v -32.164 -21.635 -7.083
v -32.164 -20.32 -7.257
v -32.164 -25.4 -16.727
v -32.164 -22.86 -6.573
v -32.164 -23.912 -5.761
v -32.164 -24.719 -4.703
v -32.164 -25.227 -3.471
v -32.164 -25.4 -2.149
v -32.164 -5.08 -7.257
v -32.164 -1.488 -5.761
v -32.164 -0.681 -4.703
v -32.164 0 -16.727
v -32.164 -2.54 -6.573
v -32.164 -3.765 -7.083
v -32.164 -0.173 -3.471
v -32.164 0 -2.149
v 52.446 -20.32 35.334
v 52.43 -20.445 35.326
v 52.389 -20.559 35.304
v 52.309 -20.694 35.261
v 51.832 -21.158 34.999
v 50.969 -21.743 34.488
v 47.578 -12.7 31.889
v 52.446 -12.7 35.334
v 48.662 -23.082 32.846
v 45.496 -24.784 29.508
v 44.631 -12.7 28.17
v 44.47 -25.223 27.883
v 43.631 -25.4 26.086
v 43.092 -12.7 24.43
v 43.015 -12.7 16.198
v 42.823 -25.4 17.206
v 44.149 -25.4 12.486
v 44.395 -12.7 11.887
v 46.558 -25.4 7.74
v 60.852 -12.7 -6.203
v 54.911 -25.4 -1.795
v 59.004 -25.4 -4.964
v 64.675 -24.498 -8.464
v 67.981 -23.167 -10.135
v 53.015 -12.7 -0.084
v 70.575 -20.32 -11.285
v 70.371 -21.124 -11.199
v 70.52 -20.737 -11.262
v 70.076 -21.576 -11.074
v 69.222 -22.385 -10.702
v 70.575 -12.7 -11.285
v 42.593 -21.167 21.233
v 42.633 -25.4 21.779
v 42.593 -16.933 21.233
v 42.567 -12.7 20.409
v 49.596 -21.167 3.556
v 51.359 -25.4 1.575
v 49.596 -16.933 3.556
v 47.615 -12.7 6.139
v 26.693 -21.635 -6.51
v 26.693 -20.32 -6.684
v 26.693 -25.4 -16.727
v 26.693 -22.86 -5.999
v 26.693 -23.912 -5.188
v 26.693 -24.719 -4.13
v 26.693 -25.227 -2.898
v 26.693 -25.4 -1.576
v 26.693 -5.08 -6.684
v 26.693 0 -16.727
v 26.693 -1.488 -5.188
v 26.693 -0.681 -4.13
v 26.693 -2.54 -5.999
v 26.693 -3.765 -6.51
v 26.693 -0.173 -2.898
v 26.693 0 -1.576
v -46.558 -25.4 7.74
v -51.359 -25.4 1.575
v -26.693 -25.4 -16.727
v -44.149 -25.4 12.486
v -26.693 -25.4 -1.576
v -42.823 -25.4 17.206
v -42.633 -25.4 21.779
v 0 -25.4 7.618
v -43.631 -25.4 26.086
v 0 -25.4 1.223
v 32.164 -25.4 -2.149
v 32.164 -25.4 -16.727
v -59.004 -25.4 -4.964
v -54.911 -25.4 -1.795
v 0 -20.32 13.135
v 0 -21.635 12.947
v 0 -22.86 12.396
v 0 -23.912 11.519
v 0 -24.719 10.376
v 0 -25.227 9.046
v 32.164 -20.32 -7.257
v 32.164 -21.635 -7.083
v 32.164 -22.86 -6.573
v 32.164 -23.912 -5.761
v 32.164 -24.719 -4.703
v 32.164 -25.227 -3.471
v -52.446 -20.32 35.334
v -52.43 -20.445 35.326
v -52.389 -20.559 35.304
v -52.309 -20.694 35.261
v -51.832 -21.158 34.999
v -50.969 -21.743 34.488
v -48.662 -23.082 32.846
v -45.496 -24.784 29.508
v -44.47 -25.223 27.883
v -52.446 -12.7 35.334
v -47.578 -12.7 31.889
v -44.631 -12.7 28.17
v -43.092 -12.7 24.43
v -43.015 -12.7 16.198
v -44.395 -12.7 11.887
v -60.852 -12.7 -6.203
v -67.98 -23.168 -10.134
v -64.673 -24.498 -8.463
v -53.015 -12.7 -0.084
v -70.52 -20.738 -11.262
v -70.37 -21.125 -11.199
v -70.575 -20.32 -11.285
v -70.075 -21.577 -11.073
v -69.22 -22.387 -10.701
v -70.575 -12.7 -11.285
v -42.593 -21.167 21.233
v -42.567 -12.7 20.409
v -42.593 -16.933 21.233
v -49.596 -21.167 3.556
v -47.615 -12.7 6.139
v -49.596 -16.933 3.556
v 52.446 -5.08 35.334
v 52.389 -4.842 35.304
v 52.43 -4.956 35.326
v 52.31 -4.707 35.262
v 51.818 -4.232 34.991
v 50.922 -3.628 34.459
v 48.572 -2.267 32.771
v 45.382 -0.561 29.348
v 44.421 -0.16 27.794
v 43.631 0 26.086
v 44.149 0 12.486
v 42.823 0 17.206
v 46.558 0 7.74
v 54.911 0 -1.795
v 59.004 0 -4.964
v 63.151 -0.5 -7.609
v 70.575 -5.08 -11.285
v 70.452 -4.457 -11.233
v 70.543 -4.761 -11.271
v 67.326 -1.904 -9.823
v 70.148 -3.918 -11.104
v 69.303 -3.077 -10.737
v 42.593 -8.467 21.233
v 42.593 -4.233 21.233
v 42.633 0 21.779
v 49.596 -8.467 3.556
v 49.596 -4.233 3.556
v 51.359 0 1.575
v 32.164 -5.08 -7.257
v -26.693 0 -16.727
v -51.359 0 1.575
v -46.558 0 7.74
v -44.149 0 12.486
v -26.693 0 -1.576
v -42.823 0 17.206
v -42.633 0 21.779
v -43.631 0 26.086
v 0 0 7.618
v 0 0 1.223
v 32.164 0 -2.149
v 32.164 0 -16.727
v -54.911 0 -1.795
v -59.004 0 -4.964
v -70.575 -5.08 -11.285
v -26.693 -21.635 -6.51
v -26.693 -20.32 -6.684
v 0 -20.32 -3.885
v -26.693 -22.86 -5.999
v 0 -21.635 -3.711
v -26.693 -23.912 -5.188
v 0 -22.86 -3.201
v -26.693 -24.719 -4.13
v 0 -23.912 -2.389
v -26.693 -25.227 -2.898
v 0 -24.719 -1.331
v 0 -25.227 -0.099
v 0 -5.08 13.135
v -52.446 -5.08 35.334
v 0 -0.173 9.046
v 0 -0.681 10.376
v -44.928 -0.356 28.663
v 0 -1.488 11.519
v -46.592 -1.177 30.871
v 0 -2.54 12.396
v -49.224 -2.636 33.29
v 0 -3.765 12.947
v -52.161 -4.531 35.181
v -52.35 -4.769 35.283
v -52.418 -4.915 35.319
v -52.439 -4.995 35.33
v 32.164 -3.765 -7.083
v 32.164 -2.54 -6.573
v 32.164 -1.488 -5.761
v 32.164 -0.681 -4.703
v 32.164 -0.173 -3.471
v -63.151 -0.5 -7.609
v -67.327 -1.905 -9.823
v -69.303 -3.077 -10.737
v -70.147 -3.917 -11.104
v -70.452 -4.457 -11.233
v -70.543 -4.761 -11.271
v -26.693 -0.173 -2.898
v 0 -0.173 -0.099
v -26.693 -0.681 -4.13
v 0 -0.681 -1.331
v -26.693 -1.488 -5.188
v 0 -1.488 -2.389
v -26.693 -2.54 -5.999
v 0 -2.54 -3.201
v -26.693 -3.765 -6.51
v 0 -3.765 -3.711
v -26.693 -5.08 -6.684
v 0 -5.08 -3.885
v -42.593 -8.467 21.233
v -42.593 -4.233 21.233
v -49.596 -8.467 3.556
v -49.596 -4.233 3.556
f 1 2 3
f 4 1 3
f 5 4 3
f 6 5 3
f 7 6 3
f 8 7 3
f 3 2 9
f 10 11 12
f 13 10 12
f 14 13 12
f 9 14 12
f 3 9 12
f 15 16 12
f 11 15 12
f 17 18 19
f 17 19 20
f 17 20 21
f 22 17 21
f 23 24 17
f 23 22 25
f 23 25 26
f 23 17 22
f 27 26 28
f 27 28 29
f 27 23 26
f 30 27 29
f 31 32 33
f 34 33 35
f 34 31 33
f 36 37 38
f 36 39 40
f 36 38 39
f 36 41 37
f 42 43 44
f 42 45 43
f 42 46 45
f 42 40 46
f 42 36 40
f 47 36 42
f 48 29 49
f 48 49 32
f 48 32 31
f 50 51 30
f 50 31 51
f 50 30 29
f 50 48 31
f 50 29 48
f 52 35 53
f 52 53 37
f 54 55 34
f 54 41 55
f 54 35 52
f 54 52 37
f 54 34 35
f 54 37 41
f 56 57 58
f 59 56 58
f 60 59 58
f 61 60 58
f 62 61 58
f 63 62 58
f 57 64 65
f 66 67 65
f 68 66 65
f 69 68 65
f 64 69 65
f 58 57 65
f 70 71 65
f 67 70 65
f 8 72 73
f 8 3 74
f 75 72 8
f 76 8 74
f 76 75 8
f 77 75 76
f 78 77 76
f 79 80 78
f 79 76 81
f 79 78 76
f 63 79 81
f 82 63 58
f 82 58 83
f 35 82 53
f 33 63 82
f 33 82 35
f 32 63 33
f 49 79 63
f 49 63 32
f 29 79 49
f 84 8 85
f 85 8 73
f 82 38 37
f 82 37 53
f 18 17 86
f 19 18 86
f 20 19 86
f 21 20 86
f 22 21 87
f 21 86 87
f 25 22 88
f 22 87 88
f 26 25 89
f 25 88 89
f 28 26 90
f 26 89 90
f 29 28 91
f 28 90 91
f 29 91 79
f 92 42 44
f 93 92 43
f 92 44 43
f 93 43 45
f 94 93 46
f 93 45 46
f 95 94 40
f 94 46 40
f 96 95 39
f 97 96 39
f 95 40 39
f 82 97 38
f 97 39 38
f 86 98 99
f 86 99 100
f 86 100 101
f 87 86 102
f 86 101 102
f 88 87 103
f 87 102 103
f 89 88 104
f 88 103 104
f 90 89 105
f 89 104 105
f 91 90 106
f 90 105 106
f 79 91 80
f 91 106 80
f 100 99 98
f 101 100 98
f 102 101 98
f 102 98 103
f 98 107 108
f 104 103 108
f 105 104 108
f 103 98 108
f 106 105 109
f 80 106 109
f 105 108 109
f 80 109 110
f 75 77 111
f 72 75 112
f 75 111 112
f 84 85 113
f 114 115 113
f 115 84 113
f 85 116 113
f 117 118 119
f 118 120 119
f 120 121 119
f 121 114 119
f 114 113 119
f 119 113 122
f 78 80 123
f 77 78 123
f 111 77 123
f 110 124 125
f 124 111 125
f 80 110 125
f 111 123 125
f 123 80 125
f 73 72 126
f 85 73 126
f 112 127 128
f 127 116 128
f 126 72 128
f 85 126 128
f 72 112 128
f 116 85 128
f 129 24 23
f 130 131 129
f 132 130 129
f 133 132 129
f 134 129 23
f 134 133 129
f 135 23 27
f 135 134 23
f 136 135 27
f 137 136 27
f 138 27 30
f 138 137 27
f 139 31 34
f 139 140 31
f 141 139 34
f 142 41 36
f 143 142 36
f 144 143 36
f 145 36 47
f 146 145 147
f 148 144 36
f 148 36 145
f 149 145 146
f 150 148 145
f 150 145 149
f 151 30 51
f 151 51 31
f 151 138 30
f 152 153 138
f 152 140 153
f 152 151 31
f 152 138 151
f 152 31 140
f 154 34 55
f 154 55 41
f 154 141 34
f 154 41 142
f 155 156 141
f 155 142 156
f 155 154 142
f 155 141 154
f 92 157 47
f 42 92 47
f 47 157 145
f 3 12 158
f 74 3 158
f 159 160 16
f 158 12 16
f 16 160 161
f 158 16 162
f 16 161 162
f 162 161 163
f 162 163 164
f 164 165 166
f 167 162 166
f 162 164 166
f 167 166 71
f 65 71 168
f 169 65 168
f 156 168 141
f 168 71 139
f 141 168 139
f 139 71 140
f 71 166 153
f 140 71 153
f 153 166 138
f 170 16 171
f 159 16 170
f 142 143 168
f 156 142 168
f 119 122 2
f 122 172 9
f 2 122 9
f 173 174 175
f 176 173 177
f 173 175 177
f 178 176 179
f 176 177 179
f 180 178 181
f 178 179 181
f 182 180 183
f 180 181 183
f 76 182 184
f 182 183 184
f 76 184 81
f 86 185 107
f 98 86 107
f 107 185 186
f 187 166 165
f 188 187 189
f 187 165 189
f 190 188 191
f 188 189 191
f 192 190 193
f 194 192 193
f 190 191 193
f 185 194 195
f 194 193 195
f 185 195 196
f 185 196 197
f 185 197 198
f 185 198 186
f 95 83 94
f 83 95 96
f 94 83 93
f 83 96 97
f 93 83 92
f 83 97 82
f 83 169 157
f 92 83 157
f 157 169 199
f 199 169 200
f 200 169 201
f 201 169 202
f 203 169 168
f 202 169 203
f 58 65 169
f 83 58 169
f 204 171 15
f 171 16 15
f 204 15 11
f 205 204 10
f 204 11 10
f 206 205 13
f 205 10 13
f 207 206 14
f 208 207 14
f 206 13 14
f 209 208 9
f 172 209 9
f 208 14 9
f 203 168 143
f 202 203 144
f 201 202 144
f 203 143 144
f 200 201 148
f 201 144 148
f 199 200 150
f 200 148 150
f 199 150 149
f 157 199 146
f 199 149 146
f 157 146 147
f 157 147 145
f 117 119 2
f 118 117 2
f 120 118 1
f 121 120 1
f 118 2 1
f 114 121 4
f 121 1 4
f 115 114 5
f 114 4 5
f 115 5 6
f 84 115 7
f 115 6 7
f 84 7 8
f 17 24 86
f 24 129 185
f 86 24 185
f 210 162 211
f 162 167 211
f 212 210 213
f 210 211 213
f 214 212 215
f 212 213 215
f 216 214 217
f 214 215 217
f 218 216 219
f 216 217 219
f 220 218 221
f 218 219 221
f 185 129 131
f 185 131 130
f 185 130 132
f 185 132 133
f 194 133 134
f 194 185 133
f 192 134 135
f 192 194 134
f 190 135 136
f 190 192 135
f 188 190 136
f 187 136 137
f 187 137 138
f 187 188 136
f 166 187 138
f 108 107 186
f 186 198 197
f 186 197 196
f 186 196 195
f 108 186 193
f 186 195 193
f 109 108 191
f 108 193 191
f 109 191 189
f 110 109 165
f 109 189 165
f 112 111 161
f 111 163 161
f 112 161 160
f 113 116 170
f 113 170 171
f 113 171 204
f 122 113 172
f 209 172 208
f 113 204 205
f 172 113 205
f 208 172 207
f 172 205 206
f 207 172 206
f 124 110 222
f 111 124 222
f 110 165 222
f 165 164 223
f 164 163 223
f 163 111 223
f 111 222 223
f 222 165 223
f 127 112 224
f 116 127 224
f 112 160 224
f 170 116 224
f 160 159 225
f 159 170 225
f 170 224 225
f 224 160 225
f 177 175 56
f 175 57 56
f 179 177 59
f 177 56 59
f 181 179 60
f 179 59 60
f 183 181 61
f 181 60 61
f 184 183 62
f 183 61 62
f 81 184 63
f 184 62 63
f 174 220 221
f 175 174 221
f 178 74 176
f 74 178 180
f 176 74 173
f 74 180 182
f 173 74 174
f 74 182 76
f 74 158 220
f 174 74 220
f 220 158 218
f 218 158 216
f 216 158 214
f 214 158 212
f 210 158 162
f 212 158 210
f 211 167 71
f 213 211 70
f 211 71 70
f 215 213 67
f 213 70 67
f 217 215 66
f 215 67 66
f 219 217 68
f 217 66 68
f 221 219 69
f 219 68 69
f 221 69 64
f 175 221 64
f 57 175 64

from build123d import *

# Parameters (mm, degrees)
F1_DEPTH = 12.7
F2_DEPTH = 25.4
F3_R     = 5.08
F5_DEPTH = 19.812


with BuildPart() as f1:
    # F0 (on Front) → F1 (new body)
    with BuildSketch(Plane.XZ):
        with BuildLine():
            Line((52.4458624423, 35.3338979185), (0, 13.1345894188))
            Line((0, 13.1345894188), (-52.4458624423, 35.3338979185))
            add(Edge.make_bspline(
                [(-52.4458624423, 35.3338979185), (-33.2064628601, 25.1592136919), (-43.5661375523, 0), (-70.5752968788, -11.2846475095)],
                knots=[0, 0, 0, 0, 50.0196478477, 50.0196478477, 50.0196478477, 50.0196478477], degree=3))
            Line((-70.5752968788, -11.2846475095), (-32.1640369767, -7.2572545808))
            Line((-32.1640369767, -7.2572545808), (-26.6933627427, -6.6836583285))
            Line((-26.6933627427, -6.6836583285), (0, -3.8848784752))
            Line((0, -3.8848784752), (26.6933627427, -6.6836583285))
            Line((26.6933627427, -6.6836583285), (32.1640369767, -7.2572545808))
            Line((32.1640369767, -7.2572545808), (70.5752968788, -11.2846475095))
            add(Edge.make_bspline(
                [(52.4458624423, 35.3338979185), (33.2064628601, 25.1592136919), (43.5661375523, 0), (70.5752968788, -11.2846475095)],
                knots=[0, 0, 0, 0, 50.0196478477, 50.0196478477, 50.0196478477, 50.0196478477], degree=3))
        make_face()
    extrude(amount=F1_DEPTH)

    # F0 (on Front) → F2 (join)
    with BuildSketch(Plane.XZ):
        with BuildLine():
            Line((52.4458624423, 35.3338979185), (0, 13.1345894188))
            Line((0, 13.1345894188), (-52.4458624423, 35.3338979185))
            add(Edge.make_bspline(
                [(-52.4458624423, 35.3338979185), (-33.2064628601, 25.1592136919), (-43.5661375523, 0), (-70.5752968788, -11.2846475095)],
                knots=[0, 0, 0, 0, 50.0196478477, 50.0196478477, 50.0196478477, 50.0196478477], degree=3))
            Line((-70.5752968788, -11.2846475095), (-32.1640369767, -7.2572545808))
            Line((-32.1640369767, -7.2572545808), (-26.6933627427, -6.6836583285))
            Line((-26.6933627427, -6.6836583285), (0, -3.8848784752))
            Line((0, -3.8848784752), (26.6933627427, -6.6836583285))
            Line((26.6933627427, -6.6836583285), (32.1640369767, -7.2572545808))
            Line((32.1640369767, -7.2572545808), (70.5752968788, -11.2846475095))
            add(Edge.make_bspline(
                [(52.4458624423, 35.3338979185), (33.2064628601, 25.1592136919), (43.5661375523, 0), (70.5752968788, -11.2846475095)],
                knots=[0, 0, 0, 0, 50.0196478477, 50.0196478477, 50.0196478477, 50.0196478477], degree=3))
        make_face()
        Polygon((-26.6933627427, -6.6836583285), (-32.1640369767, -7.2572545808), (-32.1640369767, -16.7267285287), (-26.6933627427, -16.7267285287), align=None)
        Polygon((32.1640369767, -16.7267285287), (32.1640369767, -7.2572545808), (26.6933627427, -6.6836583285), (26.6933627427, -16.7267285287), align=None)
    extrude(amount=F2_DEPTH)

    # F3
    f3_edges = [f1.edges().sort_by_distance(p)[0] for p in [
        (-26.222931, -25.4, 24.234244),
        (26.222931, -25.4, 24.234244),
        (-26.222931, 0, 24.234244),
        (26.222931, 0, 24.234244),
        (51.369667, -25.4, -9.270951),
        (13.346681, -25.4, -5.284268),
        (-13.346681, -25.4, -5.284268),
        (-51.369667, -25.4, -9.270951),
        (51.369667, 0, -9.270951),
        (13.346681, 0, -5.284268),
        (-13.346681, 0, -5.284268),
        (-51.369667, 0, -9.270951),
    ]]
    fillet(f3_edges, radius=F3_R)

    # F4 (on face) → F5 (join)
    with BuildSketch(Plane.XZ.offset(25.4)):
        with BuildLine():
            Line((-1.0620621516, 7.1502164938), (-12.1599985287, 7.1502164938))
            Line((-12.1599985287, 7.1502164938), (-12.1599985287, 2.2335385438))
            Line((-12.1599985287, 2.2335385438), (-11.2093127532, 2.2335385438))
            Line((-11.2093127532, 2.2335385438), (-9.1895056006, 6.5985840067))
            Line((-9.1895056006, 6.5985840067), (-11.8463042324, 6.5985840067))
            Line((-11.8463042324, 6.5985840067), (-11.8463042324, 7.1086039851))
            Line((-11.8463042324, 7.1086039851), (-8.6026625293, 7.1086039851))
            Line((-8.6026625293, 7.1086039851), (-8.6026625293, 6.6647372257))
            Line((-8.6026625293, 6.6647372257), (-10.5957949968, 2.2335385438))
            Line((-10.5957949968, 2.2335385438), (-7.6288252286, 2.2335385438))
            add(Edge.make_bspline(
                [(-7.6288252286, 2.2335385438), (-7.6332434575, 2.2374605361), (-7.6375724239, 2.2415409493)],
                knots=[0.9611752535, 0.9611752535, 0.9611752535, 1, 1, 1], degree=2))
            add(Edge.make_bspline(
                [(-7.6375724239, 2.2415409493), (-7.7490726074, 2.3466392085), (-7.7490726074, 2.586711374)],
                knots=[0, 0, 0, 1, 1, 1], degree=2))
            add(Edge.make_bspline(
                [(-7.7490726074, 2.586711374), (-7.7490726074, 2.8107787285), (-7.6471753105, 2.9254798742)],
                knots=[0, 0, 0, 1, 1, 1], degree=2))
            add(Edge.make_bspline(
                [(-7.6471753105, 2.9254798742), (-7.5452780136, 3.04018102), (-7.355354256, 3.04018102)],
                knots=[0, 0, 0, 1, 1, 1], degree=2))
            add(Edge.make_bspline(
                [(-7.355354256, 3.04018102), (-7.1622295361, 3.04018102), (-7.0539303148, 2.9254798742)],
                knots=[0, 0, 0, 1, 1, 1], degree=2))
            add(Edge.make_bspline(
                [(-7.0539303148, 2.9254798742), (-6.9456310935, 2.8107787285), (-6.9456310935, 2.586711374)],
                knots=[0, 0, 0, 1, 1, 1], degree=2))
            add(Edge.make_bspline(
                [(-6.9456310935, 2.586711374), (-6.9456310935, 2.3701129313), (-7.0555307959, 2.2532778107)],
                knots=[0, 0, 0, 1, 1, 1], degree=2))
            add(Edge.make_bspline(
                [(-7.0555307959, 2.2532778107), (-7.0652437796, 2.2429518718), (-7.0755818393, 2.2335385438)],
                knots=[0, 0, 0, 0.0883804366, 0.0883804366, 0.0883804366], degree=2))
            Line((-7.0755818393, 2.2335385438), (-3.9249897575, 2.2335385438))
            Line((-3.9249897575, 2.2335385438), (-3.9249897575, 3.3538753163))
            Line((-3.9249897575, 3.3538753163), (-6.2958357654, 3.3538753163))
            Line((-6.2958357654, 3.3538753163), (-6.2958357654, 3.8372206095))
            Line((-6.2958357654, 3.8372206095), (-3.9815400898, 7.1352786701))
            Line((-3.9815400898, 7.1352786701), (-3.3946970185, 7.1352786701))
            Line((-3.3946970185, 7.1352786701), (-3.3946970185, 3.8574933702))
            Line((-3.3946970185, 3.8574933702), (-2.6712795597, 3.8574933702))
            Line((-2.6712795597, 3.8574933702), (-2.6712795597, 3.3538753163))
            Line((-2.6712795597, 3.3538753163), (-3.3946970185, 3.3538753163))
            Line((-3.3946970185, 3.3538753163), (-3.3946970185, 2.2335385438))
            Line((-3.3946970185, 2.2335385438), (-1.640698507, 2.2335385438))
            add(Edge.make_bspline(
                [(-1.640698507, 2.2335385438), (-1.9389440856, 2.2937967953), (-2.2210108759, 2.4298642258)],
                knots=[0.0691615274, 0.0691615274, 0.0691615274, 1, 1, 1], degree=2))
            Line((-2.2210108759, 2.4298642258), (-2.2210108759, 2.9569560026))
            add(Edge.make_bspline(
                [(-2.2210108759, 2.9569560026), (-1.9041156174, 2.8001088544), (-1.5456078503, 2.7184843182)],
                knots=[0, 0, 0, 1, 1, 1], degree=2))
            add(Edge.make_bspline(
                [(-1.5456078503, 2.7184843182), (-1.1871000831, 2.6368597819), (-0.8670038624, 2.6368597819)],
                knots=[0, 0, 0, 1, 1, 1], degree=2))
            add(Edge.make_bspline(
                [(-0.8670038624, 2.6368597819), (0.396309222, 2.6368597819), (0.396309222, 3.6270240913)],
                knots=[0, 0, 0, 1, 1, 1], degree=2))
            add(Edge.make_bspline(
                [(0.396309222, 3.6270240913), (0.396309222, 4.51475761), (-0.9971763255, 4.51475761)],
                knots=[0, 0, 0, 1, 1, 1], degree=2))
            Line((-0.9971763255, 4.51475761), (-1.4773206565, 4.51475761))
            Line((-1.4773206565, 4.51475761), (-1.4773206565, 4.9906339914))
            Line((-1.4773206565, 4.9906339914), (-0.990774401, 4.9906339914))
            add(Edge.make_bspline(
                [(-0.990774401, 4.9906339914), (-0.4210031282, 4.9906339914), (-0.087569565, 5.2424430184)],
                knots=[0, 0, 0, 1, 1, 1], degree=2))
            add(Edge.make_bspline(
                [(-0.087569565, 5.2424430184), (0.2458639983, 5.4942520453), (0.2458639983, 5.9413197669)],
                knots=[0, 0, 0, 1, 1, 1], degree=2))
            add(Edge.make_bspline(
                [(0.2458639983, 5.9413197669), (0.2458639983, 6.2976935593), (0.0009903894, 6.5014881531)],
                knots=[0, 0, 0, 1, 1, 1], degree=2))
            add(Edge.make_bspline(
                [(0.0009903894, 6.5014881531), (-0.2438832194, 6.705282747), (-0.6642762559, 6.705282747)],
                knots=[0, 0, 0, 1, 1, 1], degree=2))
            add(Edge.make_bspline(
                [(-0.6642762559, 6.705282747), (-0.9843724766, 6.705282747), (-1.2676576319, 6.6183232737)],
                knots=[0, 0, 0, 1, 1, 1], degree=2))
            add(Edge.make_bspline(
                [(-1.2676576319, 6.6183232737), (-1.5509427873, 6.5313638004), (-1.9147854915, 6.2976935593)],
                knots=[0, 0, 0, 1, 1, 1], degree=2))
            Line((-1.9147854915, 6.2976935593), (-2.1943361909, 6.6711391501))
            add(Edge.make_bspline(
                [(-2.1943361909, 6.6711391501), (-1.8945127308, 6.9080103534), (-1.5029283542, 7.0429842598)],
                knots=[0, 0, 0, 1, 1, 1], degree=2))
            add(Edge.make_bspline(
                [(-1.5029283542, 7.0429842598), (-1.2888719394, 7.116766648), (-1.0620621516, 7.1502164938)],
                knots=[0, 0, 0, 0.5466418669, 0.5466418669, 0.5466418669], degree=2))
        make_face()
        with BuildLine():
            add(Edge.make_bspline(
                [(-7.6375724239, 5.1864261798), (-7.7490726074, 5.2915244389), (-7.7490726074, 5.5315966044)],
                knots=[0, 0, 0, 1, 1, 1], degree=2))
            add(Edge.make_bspline(
                [(-7.7490726074, 5.5315966044), (-7.7490726074, 5.9818652882), (-7.355354256, 5.9818652882)],
                knots=[0, 0, 0, 1, 1, 1], degree=2))
            add(Edge.make_bspline(
                [(-7.355354256, 5.9818652882), (-6.9456310935, 5.9818652882), (-6.9456310935, 5.5315966044)],
                knots=[0, 0, 0, 1, 1, 1], degree=2))
            add(Edge.make_bspline(
                [(-6.9456310935, 5.5315966044), (-6.9456310935, 5.3149981617), (-7.0555307959, 5.1981630412)],
                knots=[0, 0, 0, 1, 1, 1], degree=2))
            add(Edge.make_bspline(
                [(-7.0555307959, 5.1981630412), (-7.1654304983, 5.0813279206), (-7.355354256, 5.0813279206)],
                knots=[0, 0, 0, 1, 1, 1], degree=2))
            add(Edge.make_bspline(
                [(-7.355354256, 5.0813279206), (-7.5260722403, 5.0813279206), (-7.6375724239, 5.1864261798)],
                knots=[0, 0, 0, 1, 1, 1], degree=2))
        make_face(mode=Mode.SUBTRACT)
        with BuildLine():
            Line((12.5685015078, 7.1502164938), (-0.2893760982, 7.1502164938))
            add(Edge.make_bspline(
                [(-0.2893760982, 7.1502164938), (0.1475144145, 7.0830202677), (0.4261848693, 6.8530605022)],
                knots=[0.2922086215, 0.2922086215, 0.2922086215, 1, 1, 1], degree=2))
            add(Edge.make_bspline(
                [(0.4261848693, 6.8530605022), (0.8199032207, 6.5281628382), (0.8199032207, 5.9615925276)],
                knots=[0, 0, 0, 1, 1, 1], degree=2))
            add(Edge.make_bspline(
                [(0.8199032207, 5.9615925276), (0.8199032207, 5.4942520453), (0.5579578134, 5.1976295475)],
                knots=[0, 0, 0, 1, 1, 1], degree=2))
            add(Edge.make_bspline(
                [(0.5579578134, 5.1976295475), (0.2960124062, 4.9010070496), (-0.1841319249, 4.8007102338)],
                knots=[0, 0, 0, 1, 1, 1], degree=2))
            Line((-0.1841319249, 4.8007102338), (-0.1841319249, 4.7740355488))
            add(Edge.make_bspline(
                [(-0.1841319249, 4.7740355488), (0.4027111464, 4.7014804054), (0.6859963017, 4.4011234516)],
                knots=[0, 0, 0, 1, 1, 1], degree=2))
            add(Edge.make_bspline(
                [(0.6859963017, 4.4011234516), (0.969281457, 4.1007664979), (0.969281457, 3.6142202424)],
                knots=[0, 0, 0, 1, 1, 1], degree=2))
            add(Edge.make_bspline(
                [(0.969281457, 3.6142202424), (0.969281457, 2.9174774687), (0.4859361638, 2.5418979031)],
                knots=[0, 0, 0, 1, 1, 1], degree=2))
            add(Edge.make_bspline(
                [(0.4859361638, 2.5418979031), (0.2070735074, 2.3252099228), (-0.2071054134, 2.2335385438)],
                knots=[0, 0, 0, 0.5769429439, 0.5769429439, 0.5769429439], degree=2))
            Line((-0.2071054134, 2.2335385438), (3.8138698717, 2.2335385438))
            Line((3.8138698717, 2.2335385438), (3.8138698717, 7.1086039851))
            Line((3.8138698717, 7.1086039851), (6.5314867854, 7.1086039851))
            Line((6.5314867854, 7.1086039851), (6.5314867854, 6.6049859312))
            Line((6.5314867854, 6.6049859312), (4.3804401823, 6.6049859312))
            Line((4.3804401823, 6.6049859312), (4.3804401823, 4.8209829945))
            Line((4.3804401823, 4.8209829945), (6.4013143223, 4.8209829945))
            Line((6.4013143223, 4.8209829945), (6.4013143223, 4.3173649406))
            Line((6.4013143223, 4.3173649406), (4.3804401823, 4.3173649406))
            Line((4.3804401823, 4.3173649406), (4.3804401823, 2.2335385438))
            Line((4.3804401823, 2.2335385438), (7.3381292616, 2.2335385438))
            Line((7.3381292616, 2.2335385438), (7.3381292616, 7.1086039851))
            Line((7.3381292616, 7.1086039851), (8.6750644767, 7.1086039851))
            add(Edge.make_bspline(
                [(8.6750644767, 7.1086039851), (9.5724008821, 7.1086039851), (10.0007963241, 6.7650340415)],
                knots=[0, 0, 0, 1, 1, 1], degree=2))
            add(Edge.make_bspline(
                [(10.0007963241, 6.7650340415), (10.4291917661, 6.421464098), (10.4291917661, 5.7311232487)],
                knots=[0, 0, 0, 1, 1, 1], degree=2))
            add(Edge.make_bspline(
                [(10.4291917661, 5.7311232487), (10.4291917661, 4.7644326621), (9.4486303434, 4.4240636808)],
                knots=[0, 0, 0, 1, 1, 1], degree=2))
            Line((9.4486303434, 4.4240636808), (10.7727617097, 2.2335385438))
            Line((10.7727617097, 2.2335385438), (11.5591314252, 2.2335385438))
            Line((11.5591314252, 2.2335385438), (11.5591314252, 7.1086039851))
            Line((11.5591314252, 7.1086039851), (12.1257017358, 7.1086039851))
            Line((12.1257017358, 7.1086039851), (12.1257017358, 2.2335385438))
            Line((12.1257017358, 2.2335385438), (12.5685015078, 2.2335385438))
            Line((12.5685015078, 2.2335385438), (12.5685015078, 7.1502164938))
        make_face()
    extrude(amount=-F5_DEPTH)


solid = f1.part
